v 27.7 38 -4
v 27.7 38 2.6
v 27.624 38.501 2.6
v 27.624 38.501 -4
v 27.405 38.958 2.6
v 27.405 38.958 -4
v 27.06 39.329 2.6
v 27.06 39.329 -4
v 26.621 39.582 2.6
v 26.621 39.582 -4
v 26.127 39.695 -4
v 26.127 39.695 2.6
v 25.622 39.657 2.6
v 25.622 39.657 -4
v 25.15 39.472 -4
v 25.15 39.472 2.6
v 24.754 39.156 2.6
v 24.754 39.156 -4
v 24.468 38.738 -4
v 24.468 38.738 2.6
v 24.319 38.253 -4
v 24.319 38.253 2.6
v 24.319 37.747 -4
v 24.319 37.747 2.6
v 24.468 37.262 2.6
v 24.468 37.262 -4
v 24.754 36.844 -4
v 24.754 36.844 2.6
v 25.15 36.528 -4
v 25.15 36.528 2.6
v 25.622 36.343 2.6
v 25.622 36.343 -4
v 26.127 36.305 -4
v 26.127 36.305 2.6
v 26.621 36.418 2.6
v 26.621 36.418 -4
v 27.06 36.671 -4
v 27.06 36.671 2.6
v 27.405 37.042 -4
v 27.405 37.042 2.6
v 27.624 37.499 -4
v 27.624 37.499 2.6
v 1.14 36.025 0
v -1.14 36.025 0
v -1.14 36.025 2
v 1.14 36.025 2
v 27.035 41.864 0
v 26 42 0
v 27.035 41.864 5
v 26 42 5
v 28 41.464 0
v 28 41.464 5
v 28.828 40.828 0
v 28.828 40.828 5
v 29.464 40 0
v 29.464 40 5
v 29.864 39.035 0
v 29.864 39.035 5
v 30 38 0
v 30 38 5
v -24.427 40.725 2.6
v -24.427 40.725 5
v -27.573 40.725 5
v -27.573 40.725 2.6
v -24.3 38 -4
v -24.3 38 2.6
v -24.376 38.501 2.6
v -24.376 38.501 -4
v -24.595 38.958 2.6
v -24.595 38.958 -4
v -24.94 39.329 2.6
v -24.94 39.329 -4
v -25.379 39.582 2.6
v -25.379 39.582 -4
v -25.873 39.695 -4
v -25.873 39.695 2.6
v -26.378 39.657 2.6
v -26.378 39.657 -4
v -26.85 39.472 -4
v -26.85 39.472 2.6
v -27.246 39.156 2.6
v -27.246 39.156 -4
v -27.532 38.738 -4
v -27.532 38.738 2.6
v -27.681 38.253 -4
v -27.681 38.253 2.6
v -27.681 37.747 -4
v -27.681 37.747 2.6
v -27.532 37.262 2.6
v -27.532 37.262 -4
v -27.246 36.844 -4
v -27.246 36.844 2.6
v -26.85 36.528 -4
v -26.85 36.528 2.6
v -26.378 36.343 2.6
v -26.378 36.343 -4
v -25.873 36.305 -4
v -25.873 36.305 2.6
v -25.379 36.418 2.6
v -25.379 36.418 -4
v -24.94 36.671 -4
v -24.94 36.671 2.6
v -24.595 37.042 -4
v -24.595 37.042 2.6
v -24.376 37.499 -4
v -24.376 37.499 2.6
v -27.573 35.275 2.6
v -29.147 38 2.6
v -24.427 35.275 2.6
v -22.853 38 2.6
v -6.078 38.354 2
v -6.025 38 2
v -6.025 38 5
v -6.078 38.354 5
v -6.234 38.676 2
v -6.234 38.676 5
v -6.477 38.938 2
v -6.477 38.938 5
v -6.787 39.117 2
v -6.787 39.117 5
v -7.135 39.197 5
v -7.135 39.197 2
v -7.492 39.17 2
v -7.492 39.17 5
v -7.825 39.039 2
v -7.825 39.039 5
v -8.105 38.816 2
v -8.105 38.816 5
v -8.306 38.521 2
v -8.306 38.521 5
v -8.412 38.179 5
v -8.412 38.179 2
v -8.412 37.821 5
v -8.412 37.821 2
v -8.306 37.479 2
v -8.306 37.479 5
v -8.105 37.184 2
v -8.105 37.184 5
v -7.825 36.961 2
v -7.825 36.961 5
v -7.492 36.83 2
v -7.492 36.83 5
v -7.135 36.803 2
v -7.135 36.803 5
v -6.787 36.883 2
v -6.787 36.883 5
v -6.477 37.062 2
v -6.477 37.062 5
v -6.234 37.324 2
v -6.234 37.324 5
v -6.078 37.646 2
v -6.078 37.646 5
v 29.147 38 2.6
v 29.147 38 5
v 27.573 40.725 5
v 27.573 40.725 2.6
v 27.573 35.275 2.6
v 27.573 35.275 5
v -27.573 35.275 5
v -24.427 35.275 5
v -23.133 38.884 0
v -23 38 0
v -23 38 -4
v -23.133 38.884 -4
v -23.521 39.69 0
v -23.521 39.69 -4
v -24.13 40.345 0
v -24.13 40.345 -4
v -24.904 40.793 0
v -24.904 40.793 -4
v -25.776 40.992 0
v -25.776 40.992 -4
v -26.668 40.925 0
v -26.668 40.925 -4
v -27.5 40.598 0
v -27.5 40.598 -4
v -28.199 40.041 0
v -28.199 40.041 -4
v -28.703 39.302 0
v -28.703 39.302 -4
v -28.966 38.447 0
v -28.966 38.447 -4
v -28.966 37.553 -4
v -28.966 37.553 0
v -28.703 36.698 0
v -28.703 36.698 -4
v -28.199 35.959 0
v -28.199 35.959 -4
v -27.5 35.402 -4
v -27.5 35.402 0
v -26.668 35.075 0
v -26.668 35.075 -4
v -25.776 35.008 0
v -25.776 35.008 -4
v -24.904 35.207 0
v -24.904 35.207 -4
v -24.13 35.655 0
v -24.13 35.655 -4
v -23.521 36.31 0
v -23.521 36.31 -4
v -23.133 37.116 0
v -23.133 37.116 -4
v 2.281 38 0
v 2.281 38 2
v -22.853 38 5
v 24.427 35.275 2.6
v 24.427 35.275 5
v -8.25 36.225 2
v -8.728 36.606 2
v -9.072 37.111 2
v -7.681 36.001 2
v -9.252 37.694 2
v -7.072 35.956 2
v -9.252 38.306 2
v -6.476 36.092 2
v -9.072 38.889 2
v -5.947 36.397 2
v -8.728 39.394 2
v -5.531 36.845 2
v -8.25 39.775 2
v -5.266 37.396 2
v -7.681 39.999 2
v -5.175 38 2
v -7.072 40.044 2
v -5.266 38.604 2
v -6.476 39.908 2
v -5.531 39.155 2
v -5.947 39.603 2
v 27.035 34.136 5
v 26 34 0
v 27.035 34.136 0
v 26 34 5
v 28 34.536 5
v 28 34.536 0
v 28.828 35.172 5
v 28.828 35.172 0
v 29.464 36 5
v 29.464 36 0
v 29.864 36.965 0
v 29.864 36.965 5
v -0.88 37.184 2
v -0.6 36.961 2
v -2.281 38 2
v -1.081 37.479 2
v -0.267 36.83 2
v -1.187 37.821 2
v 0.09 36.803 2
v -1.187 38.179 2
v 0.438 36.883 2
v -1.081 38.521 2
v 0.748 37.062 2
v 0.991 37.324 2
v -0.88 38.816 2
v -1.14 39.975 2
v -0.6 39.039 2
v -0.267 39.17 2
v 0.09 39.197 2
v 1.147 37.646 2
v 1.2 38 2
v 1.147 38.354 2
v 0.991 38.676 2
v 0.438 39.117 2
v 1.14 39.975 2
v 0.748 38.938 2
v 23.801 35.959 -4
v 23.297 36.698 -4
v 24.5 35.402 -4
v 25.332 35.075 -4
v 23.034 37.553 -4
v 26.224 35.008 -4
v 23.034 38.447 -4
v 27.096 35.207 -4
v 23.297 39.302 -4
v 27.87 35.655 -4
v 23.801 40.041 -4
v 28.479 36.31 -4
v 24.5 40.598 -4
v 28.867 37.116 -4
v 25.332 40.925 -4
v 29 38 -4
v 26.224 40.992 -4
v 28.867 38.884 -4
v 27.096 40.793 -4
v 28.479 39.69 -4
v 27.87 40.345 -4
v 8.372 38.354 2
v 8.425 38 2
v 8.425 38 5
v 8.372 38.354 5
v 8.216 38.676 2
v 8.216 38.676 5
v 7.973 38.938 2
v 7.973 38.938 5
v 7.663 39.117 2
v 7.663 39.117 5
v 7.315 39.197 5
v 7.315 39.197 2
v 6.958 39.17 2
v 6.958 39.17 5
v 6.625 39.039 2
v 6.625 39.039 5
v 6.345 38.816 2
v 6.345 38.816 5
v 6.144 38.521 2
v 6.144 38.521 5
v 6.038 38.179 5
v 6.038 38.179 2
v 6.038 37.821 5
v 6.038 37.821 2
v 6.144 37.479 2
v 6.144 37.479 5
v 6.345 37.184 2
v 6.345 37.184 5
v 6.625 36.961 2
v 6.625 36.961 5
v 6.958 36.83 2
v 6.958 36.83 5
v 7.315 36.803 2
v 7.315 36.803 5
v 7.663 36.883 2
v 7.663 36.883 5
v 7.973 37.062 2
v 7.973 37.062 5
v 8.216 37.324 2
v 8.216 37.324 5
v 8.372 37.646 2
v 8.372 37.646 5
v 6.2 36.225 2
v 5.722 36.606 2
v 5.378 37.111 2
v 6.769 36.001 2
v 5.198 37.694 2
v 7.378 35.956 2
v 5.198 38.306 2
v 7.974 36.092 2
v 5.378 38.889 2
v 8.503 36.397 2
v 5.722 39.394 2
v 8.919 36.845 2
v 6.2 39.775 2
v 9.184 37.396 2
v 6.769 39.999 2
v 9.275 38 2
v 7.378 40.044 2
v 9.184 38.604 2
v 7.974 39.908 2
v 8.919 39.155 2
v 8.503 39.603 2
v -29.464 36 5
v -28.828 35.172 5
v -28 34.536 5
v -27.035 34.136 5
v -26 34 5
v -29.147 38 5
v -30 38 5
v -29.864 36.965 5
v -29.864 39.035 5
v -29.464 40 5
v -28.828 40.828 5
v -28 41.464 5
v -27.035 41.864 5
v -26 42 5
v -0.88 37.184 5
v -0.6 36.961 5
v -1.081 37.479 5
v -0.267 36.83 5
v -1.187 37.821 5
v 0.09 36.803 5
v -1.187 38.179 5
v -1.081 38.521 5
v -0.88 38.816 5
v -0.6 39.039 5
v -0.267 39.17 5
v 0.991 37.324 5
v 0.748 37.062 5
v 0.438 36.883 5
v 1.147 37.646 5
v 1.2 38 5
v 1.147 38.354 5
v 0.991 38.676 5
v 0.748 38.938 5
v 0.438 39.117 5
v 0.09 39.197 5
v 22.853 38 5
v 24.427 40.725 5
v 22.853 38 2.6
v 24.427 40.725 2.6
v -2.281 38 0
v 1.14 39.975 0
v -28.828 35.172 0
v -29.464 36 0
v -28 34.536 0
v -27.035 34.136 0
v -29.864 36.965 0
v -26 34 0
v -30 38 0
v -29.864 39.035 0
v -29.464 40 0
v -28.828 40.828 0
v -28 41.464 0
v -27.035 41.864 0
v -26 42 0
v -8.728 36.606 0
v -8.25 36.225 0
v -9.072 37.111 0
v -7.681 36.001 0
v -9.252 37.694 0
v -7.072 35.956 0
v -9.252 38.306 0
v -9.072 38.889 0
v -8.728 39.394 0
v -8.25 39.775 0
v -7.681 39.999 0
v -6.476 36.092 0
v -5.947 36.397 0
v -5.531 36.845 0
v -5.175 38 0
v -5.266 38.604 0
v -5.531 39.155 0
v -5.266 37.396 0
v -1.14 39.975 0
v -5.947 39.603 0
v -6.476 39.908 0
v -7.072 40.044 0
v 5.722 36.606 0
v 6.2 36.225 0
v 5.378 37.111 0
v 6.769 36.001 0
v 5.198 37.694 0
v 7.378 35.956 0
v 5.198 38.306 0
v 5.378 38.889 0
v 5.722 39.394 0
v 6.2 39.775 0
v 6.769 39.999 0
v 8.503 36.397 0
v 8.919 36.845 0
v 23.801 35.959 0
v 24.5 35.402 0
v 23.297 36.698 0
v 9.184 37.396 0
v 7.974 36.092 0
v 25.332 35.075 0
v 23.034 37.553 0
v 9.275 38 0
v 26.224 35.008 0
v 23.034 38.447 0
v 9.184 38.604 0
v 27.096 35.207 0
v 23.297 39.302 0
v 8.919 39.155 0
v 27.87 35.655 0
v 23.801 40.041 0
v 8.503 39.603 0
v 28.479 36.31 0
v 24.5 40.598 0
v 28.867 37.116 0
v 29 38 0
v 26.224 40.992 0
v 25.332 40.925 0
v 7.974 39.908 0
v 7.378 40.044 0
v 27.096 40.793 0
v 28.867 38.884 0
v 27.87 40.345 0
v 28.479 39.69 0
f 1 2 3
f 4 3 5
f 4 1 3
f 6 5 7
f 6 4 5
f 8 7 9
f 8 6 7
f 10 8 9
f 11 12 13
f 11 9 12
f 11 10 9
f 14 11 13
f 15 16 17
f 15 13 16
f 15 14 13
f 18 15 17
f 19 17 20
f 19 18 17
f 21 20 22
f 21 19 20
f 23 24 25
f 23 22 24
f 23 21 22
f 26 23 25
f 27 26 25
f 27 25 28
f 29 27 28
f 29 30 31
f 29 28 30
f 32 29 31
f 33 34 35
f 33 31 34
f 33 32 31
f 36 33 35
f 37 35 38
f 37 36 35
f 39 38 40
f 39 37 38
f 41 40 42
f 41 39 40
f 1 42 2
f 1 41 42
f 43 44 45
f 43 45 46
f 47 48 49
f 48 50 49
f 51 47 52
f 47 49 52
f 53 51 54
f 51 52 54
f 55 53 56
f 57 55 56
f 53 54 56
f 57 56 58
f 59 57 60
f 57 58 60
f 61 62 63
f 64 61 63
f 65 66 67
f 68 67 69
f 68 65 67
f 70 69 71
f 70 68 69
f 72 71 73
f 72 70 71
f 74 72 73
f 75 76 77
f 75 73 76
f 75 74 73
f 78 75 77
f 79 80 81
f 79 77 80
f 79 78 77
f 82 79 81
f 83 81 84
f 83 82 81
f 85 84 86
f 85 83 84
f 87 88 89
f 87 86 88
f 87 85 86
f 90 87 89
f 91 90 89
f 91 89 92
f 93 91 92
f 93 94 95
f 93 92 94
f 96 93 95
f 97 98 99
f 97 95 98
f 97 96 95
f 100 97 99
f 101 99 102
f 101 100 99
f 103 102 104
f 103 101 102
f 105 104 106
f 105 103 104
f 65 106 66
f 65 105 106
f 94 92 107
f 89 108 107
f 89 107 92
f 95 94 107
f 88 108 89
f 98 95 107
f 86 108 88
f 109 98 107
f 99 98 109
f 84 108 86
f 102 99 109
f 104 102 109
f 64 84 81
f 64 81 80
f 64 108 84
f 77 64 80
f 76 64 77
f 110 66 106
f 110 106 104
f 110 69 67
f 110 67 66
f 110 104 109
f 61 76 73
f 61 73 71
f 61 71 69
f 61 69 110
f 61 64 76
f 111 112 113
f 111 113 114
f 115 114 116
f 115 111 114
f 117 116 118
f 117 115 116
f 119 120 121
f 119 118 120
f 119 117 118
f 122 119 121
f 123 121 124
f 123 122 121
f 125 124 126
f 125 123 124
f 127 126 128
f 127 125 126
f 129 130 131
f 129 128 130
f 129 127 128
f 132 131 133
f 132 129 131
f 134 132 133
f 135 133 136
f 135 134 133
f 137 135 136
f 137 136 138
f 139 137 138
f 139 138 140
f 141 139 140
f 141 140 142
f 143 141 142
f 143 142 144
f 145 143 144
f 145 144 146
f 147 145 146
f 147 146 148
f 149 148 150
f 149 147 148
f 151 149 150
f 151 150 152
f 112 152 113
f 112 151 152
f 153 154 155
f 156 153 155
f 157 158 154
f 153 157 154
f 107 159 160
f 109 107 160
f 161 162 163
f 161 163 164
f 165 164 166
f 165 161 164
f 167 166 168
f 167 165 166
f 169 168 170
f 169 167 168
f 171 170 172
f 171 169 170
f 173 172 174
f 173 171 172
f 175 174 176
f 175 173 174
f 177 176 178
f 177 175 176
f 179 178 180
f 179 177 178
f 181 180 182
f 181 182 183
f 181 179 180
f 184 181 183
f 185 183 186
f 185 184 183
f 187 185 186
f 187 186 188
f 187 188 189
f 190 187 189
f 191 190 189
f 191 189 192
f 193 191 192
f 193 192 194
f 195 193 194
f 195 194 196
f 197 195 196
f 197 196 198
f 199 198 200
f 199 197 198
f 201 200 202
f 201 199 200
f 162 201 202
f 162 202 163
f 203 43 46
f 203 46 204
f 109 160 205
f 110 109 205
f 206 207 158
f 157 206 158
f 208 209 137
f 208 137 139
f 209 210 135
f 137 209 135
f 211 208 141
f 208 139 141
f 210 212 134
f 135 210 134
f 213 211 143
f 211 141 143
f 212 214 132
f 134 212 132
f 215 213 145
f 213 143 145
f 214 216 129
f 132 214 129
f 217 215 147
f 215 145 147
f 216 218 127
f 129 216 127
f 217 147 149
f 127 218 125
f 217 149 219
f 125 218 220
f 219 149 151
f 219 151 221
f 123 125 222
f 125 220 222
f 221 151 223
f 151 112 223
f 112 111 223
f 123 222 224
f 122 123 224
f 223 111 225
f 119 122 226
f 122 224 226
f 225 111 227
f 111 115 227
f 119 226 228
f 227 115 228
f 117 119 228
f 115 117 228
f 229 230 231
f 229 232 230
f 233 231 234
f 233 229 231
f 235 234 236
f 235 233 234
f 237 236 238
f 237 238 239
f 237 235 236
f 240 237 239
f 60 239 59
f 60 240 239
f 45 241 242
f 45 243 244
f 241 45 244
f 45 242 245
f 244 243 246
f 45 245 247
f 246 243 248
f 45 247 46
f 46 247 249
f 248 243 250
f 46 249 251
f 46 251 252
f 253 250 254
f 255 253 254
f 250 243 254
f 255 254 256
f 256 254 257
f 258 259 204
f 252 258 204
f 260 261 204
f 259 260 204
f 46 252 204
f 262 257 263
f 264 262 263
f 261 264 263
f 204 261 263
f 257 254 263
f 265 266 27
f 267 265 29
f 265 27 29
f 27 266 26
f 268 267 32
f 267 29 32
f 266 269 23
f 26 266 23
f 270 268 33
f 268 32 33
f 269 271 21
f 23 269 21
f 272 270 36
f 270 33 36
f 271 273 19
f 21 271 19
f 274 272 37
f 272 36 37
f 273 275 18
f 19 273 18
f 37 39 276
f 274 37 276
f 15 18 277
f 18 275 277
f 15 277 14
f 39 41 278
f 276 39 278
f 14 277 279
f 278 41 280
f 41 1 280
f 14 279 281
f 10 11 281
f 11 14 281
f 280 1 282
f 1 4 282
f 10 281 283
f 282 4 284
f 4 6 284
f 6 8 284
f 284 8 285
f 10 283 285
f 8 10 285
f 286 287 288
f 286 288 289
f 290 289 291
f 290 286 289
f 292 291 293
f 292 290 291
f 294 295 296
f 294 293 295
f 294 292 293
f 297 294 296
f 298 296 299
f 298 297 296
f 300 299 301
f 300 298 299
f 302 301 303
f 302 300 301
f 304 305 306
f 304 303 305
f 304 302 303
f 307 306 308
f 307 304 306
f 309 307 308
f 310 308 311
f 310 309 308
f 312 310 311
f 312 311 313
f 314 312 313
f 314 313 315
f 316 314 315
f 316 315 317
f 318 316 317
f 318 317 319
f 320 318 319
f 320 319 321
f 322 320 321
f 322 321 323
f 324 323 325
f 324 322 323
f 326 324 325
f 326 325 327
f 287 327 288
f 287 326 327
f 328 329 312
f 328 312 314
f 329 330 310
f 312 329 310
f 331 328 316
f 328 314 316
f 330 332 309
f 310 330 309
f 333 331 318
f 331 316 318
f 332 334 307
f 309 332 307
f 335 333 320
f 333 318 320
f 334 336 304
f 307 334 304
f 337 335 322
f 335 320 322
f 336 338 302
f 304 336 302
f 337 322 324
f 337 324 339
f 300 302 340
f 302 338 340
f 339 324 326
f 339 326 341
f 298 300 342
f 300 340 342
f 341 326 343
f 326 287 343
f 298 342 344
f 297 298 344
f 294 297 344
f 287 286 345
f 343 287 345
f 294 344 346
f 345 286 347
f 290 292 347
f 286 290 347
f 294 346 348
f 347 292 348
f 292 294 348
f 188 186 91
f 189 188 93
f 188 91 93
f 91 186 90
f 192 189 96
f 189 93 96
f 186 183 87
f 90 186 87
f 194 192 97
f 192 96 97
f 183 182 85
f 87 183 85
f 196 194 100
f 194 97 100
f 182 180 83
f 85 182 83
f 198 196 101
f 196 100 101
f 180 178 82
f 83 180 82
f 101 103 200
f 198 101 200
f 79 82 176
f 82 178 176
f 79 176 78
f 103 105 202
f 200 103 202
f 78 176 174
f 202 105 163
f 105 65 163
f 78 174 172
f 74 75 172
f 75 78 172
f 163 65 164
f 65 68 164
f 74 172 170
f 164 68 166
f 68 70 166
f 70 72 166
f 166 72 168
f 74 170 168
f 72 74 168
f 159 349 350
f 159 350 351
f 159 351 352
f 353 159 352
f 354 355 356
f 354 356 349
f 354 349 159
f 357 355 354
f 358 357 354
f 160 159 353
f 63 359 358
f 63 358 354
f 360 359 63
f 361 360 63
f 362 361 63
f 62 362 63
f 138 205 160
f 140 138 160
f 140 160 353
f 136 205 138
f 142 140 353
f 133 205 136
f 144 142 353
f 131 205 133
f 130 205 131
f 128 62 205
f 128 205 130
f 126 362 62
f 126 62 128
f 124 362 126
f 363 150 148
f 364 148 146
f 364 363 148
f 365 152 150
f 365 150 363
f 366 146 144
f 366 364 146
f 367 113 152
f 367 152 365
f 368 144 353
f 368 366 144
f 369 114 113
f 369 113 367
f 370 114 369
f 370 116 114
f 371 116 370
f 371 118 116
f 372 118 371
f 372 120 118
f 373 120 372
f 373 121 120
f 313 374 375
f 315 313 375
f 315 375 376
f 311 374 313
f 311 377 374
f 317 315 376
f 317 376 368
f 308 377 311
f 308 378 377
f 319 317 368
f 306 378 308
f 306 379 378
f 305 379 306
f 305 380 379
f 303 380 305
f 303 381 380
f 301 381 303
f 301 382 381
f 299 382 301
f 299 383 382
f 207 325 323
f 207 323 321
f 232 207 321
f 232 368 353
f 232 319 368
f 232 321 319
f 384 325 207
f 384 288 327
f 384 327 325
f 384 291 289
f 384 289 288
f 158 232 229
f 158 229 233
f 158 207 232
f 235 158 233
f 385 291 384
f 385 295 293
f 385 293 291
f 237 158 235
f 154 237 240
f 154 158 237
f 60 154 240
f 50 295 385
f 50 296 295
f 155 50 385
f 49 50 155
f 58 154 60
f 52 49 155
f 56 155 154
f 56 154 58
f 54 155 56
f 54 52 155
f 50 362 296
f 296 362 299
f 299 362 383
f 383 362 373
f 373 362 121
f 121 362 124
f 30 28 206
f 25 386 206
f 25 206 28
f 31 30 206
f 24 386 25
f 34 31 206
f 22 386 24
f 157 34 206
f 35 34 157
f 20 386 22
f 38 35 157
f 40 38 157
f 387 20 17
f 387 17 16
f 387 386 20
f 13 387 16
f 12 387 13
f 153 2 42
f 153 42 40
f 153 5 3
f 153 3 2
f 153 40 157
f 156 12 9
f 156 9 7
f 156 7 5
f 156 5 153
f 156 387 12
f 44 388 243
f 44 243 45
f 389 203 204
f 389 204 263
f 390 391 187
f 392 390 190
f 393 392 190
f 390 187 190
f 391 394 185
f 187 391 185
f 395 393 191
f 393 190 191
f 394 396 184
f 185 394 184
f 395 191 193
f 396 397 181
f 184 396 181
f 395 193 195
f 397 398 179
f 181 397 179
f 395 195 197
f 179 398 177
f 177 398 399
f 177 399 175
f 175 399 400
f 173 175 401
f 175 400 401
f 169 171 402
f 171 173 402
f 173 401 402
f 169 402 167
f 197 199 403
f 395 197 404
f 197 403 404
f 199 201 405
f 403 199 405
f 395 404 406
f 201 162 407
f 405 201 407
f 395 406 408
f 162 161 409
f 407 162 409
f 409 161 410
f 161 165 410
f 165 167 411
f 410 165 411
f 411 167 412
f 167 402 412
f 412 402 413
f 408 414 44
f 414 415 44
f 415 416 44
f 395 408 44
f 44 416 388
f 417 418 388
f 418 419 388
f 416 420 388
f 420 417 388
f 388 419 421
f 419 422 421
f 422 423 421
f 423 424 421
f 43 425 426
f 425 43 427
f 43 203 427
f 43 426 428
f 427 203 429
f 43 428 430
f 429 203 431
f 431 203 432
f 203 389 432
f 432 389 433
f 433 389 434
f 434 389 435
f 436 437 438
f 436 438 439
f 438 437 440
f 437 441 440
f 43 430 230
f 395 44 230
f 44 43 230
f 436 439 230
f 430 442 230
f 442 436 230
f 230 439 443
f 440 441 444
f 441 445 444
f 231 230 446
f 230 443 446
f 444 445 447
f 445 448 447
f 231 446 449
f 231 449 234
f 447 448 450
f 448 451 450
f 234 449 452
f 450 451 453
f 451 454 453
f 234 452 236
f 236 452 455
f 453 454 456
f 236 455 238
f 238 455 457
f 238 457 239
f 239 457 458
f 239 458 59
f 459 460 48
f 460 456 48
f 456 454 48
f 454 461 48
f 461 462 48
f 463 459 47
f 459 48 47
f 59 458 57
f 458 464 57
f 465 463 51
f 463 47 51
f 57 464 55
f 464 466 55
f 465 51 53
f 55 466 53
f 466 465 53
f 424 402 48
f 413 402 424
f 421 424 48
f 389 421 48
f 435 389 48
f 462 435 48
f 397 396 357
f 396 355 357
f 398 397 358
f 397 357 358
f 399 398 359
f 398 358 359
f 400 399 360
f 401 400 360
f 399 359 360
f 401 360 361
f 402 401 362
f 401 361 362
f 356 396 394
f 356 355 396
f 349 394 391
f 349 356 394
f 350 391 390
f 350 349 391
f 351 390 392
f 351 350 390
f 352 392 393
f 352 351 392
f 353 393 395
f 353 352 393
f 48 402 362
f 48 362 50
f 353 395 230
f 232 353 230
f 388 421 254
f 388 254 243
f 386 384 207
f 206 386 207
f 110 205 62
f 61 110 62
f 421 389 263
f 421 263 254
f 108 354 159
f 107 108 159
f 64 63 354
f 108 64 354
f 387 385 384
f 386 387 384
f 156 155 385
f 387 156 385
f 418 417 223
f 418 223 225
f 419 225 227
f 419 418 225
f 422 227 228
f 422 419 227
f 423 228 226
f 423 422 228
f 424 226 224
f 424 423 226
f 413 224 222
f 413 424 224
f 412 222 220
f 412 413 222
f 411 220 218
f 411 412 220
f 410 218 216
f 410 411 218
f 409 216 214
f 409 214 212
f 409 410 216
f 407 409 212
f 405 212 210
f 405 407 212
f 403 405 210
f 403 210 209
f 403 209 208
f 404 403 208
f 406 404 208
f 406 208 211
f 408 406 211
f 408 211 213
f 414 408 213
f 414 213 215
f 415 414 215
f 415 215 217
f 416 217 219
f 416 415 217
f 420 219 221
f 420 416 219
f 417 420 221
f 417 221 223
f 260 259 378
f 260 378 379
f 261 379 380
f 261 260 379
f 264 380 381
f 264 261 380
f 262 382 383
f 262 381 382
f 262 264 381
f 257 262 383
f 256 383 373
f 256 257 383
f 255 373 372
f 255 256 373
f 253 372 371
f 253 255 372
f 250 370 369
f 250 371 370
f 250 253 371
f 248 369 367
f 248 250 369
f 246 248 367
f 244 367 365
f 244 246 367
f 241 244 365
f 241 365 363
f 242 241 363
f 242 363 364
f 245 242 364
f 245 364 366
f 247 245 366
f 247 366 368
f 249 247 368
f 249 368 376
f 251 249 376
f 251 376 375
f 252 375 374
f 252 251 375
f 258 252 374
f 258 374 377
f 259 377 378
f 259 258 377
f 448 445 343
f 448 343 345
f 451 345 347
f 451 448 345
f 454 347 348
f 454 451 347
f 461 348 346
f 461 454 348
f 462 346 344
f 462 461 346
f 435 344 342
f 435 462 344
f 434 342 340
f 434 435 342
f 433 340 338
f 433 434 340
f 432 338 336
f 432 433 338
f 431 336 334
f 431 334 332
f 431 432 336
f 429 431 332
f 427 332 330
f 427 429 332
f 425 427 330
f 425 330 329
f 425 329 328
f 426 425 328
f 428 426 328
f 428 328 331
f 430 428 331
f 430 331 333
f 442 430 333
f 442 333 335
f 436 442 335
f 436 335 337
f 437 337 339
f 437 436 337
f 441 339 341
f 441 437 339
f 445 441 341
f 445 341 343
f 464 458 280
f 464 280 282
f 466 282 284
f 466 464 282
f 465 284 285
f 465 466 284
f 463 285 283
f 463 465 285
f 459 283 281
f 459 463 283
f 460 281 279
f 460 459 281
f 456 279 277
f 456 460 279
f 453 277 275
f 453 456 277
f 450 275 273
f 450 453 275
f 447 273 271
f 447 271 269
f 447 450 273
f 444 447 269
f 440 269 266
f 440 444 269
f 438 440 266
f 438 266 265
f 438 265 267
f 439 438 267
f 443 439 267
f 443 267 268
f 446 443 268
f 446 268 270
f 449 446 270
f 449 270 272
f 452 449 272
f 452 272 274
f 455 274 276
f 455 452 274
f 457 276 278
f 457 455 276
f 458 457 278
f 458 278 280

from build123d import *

# Parameters (mm, degrees)
F2_W      = 60
F2_H      = 8
F2_R      = 3
F5_DEPTH  = 5
F1_R      = 3
F1_R_2    = 1.7
F6_DEPTH  = 4
F0_R      = 1.7
F7_DEPTH  = 12.5
F3_R      = 2.05
F8_DEPTH  = 2
F9_DEPTH  = 2
F11_DEPTH = 2.4
F12_R     = 3.99999
F4_R      = 1.2
F13_DEPTH = 5.001


# Not quite as in the source:
# - a fillet or chamfer is up to 0.001 mm smaller than in the source, because OpenCascade refuses the exact size


with BuildPart() as f5:
    # F2 (on face) → F5 (new body)
    with BuildSketch(Plane.XY):
        with Locations((0, 38)):
            Rectangle(F2_W, F2_H)
        with Locations((-26, 38)):
            Circle(F2_R, mode=Mode.SUBTRACT)
        Polygon((1.1402667816, 36.025), (0, 36.025), (-1.1402667816, 36.025), (-2.2805335633, 38), (-1.1402667816, 39.975), (0, 39.975), (1.1402667816, 39.975), (2.2805335633, 38), align=None, mode=Mode.SUBTRACT)
        with Locations((26, 38)):
            Circle(F2_R, mode=Mode.SUBTRACT)
        Polygon((-1.1402667816, 36.025), (0, 36.025), (1.1402667816, 36.025), (2.2805335633, 38), (1.1402667816, 39.975), (0, 39.975), (-1.1402667816, 39.975), (-2.2805335633, 38), align=None)
        with Locations((-26, 38)):
            Circle(F2_R)
        with Locations((26, 38)):
            Circle(F2_R)
    extrude(amount=F5_DEPTH)

    # F1 (on Top) → F6 (join)
    with BuildSketch(Plane.XY):
        with Locations((-26, 38)):
            Circle(F1_R)
        with Locations((-26, 38)):
            Circle(F1_R_2, mode=Mode.SUBTRACT)
        with Locations((26, 38)):
            Circle(F1_R)
        with Locations((26, 38)):
            Circle(F1_R_2, mode=Mode.SUBTRACT)
    extrude(amount=-F6_DEPTH)

    # F0 (on Top) → F7 (cut, symmetric)
    with BuildSketch(Plane.XY):
        with Locations((-26, 38)):
            Circle(F0_R)
        with Locations((26, 38)):
            Circle(F0_R)
        with Locations((-26, -38)):
            Circle(F0_R)
        with Locations((26, -38)):
            Circle(F0_R)
    extrude(amount=F7_DEPTH, both=True, mode=Mode.SUBTRACT)

    # F3 (on face) → F8 (cut)
    with BuildSketch(Plane.XY):
        with Locations((-7.225, 38)):
            Circle(F3_R)
        with Locations((7.225, 38)):
            Circle(F3_R)
    extrude(amount=F8_DEPTH, mode=Mode.SUBTRACT)

    # F2 (on face) → F9 (cut)
    with BuildSketch(Plane.XY):
        Polygon((-1.1402667816, 36.025), (0, 36.025), (1.1402667816, 36.025), (2.2805335633, 38), (1.1402667816, 39.975), (0, 39.975), (-1.1402667816, 39.975), (-2.2805335633, 38), align=None)
    extrude(amount=F9_DEPTH, mode=Mode.SUBTRACT)

    # F10 (on face) → F11 (cut)
    with BuildSketch(Plane.XY.offset(5)):
        Polygon((-27.5732794835, 35.275), (-26, 35.275), (-24.4267205165, 35.275), (-22.8534410329, 38), (-24.4267205165, 40.725), (-26, 40.725), (-27.5732794835, 40.725), (-29.1465589671, 38), align=None)
        Polygon((22.8534410329, 38), (24.4267205165, 35.275), (26, 35.275), (27.5732794835, 35.275), (29.1465589671, 38), (27.5732794835, 40.725), (26, 40.725), (24.4267205165, 40.725), align=None)
    extrude(amount=-F11_DEPTH, mode=Mode.SUBTRACT)

    # F12 (radius 4 in the source; OpenCascade refuses exactly that, so slightly less here)
    f12_edges = [f5.edges().sort_by_distance(p)[0] for p in [
        (-30, 42, 2.5),
        (-30, 34, 2.5),
        (30, 42, 2.5),
        (30, 34, 2.5),
    ]]
    fillet(f12_edges, radius=F12_R)

    # F4 (on face) → F13 (cut, through all)
    with BuildSketch(Plane.XY):
        with Locations((-7.225, 38)):
            Circle(F4_R)
        with Locations((0, 38)):
            Circle(F4_R)
        with Locations((7.225, 38)):
            Circle(F4_R)
    extrude(amount=F13_DEPTH, mode=Mode.SUBTRACT)


solid = f5.part
